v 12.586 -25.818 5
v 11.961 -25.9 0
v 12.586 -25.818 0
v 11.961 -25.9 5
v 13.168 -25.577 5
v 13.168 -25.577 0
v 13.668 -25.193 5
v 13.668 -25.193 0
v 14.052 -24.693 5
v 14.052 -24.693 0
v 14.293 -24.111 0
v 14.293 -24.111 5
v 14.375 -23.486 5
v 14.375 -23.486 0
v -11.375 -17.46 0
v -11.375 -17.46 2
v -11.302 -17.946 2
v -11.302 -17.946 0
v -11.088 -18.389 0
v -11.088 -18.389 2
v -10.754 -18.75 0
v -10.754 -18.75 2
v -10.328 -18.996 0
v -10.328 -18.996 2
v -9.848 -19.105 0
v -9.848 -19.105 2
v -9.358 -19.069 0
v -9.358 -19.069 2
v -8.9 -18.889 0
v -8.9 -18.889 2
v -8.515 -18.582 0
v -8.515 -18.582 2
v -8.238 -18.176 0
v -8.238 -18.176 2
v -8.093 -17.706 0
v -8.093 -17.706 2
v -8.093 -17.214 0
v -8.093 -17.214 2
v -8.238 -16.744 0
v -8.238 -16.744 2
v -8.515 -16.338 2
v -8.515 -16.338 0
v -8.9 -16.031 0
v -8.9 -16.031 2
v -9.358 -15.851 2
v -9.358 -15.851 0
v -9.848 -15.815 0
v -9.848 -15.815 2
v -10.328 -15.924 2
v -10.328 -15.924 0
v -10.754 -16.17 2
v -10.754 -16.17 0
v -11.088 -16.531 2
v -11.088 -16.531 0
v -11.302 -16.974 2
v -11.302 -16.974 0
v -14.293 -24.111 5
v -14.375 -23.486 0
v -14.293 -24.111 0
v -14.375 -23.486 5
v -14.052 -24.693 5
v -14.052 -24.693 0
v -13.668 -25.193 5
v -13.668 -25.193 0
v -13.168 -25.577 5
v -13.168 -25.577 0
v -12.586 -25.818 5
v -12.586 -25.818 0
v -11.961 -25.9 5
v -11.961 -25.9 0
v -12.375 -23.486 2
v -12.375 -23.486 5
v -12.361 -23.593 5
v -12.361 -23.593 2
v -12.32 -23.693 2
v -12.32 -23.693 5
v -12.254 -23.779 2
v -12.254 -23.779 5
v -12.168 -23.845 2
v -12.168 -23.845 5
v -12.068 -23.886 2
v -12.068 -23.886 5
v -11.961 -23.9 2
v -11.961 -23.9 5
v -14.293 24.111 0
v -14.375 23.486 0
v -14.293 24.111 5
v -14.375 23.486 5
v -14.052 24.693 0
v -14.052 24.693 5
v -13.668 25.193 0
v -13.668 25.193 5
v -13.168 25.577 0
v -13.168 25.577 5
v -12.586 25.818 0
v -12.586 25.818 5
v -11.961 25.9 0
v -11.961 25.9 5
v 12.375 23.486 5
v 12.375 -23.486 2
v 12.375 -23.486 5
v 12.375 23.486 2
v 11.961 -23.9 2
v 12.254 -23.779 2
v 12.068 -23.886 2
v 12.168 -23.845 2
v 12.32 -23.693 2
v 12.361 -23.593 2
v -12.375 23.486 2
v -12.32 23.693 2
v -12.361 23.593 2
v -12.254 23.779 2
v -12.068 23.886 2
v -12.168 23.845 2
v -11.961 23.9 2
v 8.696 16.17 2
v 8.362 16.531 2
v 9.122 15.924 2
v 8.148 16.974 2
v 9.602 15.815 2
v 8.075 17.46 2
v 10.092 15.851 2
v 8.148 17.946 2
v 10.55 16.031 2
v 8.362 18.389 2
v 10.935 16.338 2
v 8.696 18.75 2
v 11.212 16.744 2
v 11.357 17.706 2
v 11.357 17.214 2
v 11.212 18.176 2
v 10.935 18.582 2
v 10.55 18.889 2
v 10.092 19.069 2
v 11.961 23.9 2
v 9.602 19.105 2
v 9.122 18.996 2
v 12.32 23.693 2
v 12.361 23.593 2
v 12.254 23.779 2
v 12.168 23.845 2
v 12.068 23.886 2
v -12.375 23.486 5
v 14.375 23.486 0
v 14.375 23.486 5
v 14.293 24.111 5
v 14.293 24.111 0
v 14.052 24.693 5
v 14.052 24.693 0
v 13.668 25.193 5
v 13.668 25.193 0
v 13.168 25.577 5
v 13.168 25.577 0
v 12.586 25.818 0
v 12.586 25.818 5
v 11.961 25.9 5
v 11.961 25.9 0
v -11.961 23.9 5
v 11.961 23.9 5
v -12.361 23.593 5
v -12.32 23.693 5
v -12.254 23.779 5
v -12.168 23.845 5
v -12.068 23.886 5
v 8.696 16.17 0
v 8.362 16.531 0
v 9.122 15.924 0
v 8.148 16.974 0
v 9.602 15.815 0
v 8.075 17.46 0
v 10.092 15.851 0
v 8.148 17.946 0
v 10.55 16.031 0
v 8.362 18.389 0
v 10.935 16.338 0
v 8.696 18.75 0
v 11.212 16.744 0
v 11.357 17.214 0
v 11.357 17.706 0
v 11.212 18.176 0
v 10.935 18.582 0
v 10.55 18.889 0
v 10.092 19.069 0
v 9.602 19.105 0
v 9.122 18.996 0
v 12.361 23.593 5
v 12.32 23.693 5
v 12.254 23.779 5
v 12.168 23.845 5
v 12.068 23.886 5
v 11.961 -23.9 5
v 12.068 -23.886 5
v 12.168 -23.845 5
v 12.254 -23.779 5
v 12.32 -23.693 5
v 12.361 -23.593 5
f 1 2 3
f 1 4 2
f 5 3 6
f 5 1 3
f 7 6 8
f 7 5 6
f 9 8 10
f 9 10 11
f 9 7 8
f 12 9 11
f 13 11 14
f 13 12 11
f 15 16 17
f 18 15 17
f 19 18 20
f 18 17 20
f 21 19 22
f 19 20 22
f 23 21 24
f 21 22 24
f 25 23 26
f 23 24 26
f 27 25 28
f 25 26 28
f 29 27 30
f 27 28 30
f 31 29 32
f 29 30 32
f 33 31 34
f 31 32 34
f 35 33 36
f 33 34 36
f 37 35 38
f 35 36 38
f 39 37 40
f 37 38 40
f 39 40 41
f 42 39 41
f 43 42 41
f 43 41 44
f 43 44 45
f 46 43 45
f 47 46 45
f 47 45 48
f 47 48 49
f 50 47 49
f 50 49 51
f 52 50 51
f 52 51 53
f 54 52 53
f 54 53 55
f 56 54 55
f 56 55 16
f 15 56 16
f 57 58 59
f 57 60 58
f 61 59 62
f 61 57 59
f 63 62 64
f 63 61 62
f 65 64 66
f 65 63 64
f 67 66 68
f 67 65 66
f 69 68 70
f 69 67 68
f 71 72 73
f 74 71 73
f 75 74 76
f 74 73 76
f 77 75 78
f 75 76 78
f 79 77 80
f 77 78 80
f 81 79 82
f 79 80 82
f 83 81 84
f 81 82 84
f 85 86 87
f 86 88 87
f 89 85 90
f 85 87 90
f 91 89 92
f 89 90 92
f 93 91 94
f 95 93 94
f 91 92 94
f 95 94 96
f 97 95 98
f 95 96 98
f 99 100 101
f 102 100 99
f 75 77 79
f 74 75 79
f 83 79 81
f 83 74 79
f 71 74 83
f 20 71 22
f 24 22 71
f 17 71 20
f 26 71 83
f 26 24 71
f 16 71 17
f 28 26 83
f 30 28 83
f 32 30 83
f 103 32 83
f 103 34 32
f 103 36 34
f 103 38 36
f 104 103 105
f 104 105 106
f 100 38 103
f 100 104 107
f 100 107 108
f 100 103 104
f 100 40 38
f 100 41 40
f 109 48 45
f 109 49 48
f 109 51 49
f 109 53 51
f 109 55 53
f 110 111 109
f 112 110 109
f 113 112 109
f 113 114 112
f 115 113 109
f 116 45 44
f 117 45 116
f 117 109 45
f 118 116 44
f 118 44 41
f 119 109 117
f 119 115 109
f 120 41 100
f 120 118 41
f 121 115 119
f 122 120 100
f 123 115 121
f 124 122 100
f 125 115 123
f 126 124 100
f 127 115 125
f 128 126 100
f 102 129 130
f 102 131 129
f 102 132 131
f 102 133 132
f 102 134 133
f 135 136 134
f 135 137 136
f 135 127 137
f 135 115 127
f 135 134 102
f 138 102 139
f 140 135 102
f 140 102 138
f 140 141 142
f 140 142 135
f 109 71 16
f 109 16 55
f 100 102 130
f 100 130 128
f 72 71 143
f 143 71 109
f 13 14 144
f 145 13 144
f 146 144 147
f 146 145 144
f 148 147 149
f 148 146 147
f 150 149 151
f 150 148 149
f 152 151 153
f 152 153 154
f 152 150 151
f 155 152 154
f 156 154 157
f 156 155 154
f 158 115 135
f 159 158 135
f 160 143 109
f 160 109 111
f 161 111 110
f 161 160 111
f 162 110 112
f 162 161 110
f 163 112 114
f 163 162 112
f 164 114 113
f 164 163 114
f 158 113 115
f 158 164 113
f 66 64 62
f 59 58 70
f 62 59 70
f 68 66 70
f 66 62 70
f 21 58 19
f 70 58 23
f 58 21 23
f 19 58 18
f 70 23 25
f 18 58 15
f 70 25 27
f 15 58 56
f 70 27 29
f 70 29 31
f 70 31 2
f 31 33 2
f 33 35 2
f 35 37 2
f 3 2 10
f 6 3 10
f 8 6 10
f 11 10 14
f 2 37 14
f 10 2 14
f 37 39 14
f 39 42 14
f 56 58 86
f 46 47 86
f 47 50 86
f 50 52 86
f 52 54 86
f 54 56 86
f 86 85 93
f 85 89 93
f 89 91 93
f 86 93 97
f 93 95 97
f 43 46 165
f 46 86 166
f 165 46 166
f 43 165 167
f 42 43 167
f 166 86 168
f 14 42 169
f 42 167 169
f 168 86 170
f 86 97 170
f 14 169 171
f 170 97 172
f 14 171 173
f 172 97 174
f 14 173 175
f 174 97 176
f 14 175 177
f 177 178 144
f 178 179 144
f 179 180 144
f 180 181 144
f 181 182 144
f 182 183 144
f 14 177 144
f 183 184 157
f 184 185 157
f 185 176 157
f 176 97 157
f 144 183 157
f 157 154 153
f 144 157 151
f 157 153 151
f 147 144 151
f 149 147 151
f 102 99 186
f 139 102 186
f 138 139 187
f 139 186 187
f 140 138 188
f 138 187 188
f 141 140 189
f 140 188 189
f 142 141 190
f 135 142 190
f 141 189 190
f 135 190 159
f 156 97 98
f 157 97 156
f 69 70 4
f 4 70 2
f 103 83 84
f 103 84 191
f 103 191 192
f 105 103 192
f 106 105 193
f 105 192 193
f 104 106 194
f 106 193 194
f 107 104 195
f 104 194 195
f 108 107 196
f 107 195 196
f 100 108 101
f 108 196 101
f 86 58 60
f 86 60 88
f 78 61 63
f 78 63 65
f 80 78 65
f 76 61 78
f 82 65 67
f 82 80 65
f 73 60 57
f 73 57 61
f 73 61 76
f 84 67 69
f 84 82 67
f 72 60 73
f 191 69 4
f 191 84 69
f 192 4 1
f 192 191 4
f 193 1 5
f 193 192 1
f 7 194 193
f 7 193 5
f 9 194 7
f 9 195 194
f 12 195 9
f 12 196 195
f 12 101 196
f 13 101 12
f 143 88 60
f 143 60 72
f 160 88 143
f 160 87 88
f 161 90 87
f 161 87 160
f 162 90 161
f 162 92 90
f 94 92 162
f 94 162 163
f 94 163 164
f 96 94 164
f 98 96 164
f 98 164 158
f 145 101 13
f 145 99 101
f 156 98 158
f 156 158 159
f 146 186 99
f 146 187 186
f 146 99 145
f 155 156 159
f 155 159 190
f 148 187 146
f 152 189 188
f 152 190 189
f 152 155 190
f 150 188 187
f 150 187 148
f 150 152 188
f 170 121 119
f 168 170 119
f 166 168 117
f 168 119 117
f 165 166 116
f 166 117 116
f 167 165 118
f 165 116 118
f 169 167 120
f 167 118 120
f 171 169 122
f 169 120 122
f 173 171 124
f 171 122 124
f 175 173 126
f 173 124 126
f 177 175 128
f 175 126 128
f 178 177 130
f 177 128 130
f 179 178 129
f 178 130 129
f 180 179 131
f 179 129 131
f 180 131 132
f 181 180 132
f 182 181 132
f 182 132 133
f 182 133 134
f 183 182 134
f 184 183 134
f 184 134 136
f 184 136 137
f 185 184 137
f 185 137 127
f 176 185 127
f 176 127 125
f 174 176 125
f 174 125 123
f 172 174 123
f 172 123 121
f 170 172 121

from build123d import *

# Parameters (mm, degrees)
F0_W     = 28.75
F0_H     = 51.8
F1_DEPTH = 5
F2_R     = 2.4142135624
F3_T     = -2
F4_D     = 3.3


with BuildPart() as f1:
    # F0 (on Top) → F1 (new body)
    with BuildSketch(Plane.XY):
        Rectangle(F0_W, F0_H)
    extrude(amount=F1_DEPTH)

    # F2
    f2_edges = [f1.edges().sort_by_distance(p)[0] for p in [
        (14.375, -25.9, 2.5),
        (-14.375, -25.9, 2.5),
        (14.375, 25.9, 2.5),
        (-14.375, 25.9, 2.5),
    ]]
    fillet(f2_edges, radius=F2_R)

    # F3
    f3_openings = [f1.faces().sort_by_distance(p)[0] for p in [
        (0, 0, 5),
    ]]
    offset(amount=F3_T, openings=f3_openings)

    # F4 (through all)
    with Locations(Plane(origin=(0, 0, 0), x_dir=(1, 0, 0), z_dir=(0, 0, -1))):
        with Locations((9.725, -17.46), (-9.725, 17.46)):
            Hole(F4_D / 2)


solid = f1.part
